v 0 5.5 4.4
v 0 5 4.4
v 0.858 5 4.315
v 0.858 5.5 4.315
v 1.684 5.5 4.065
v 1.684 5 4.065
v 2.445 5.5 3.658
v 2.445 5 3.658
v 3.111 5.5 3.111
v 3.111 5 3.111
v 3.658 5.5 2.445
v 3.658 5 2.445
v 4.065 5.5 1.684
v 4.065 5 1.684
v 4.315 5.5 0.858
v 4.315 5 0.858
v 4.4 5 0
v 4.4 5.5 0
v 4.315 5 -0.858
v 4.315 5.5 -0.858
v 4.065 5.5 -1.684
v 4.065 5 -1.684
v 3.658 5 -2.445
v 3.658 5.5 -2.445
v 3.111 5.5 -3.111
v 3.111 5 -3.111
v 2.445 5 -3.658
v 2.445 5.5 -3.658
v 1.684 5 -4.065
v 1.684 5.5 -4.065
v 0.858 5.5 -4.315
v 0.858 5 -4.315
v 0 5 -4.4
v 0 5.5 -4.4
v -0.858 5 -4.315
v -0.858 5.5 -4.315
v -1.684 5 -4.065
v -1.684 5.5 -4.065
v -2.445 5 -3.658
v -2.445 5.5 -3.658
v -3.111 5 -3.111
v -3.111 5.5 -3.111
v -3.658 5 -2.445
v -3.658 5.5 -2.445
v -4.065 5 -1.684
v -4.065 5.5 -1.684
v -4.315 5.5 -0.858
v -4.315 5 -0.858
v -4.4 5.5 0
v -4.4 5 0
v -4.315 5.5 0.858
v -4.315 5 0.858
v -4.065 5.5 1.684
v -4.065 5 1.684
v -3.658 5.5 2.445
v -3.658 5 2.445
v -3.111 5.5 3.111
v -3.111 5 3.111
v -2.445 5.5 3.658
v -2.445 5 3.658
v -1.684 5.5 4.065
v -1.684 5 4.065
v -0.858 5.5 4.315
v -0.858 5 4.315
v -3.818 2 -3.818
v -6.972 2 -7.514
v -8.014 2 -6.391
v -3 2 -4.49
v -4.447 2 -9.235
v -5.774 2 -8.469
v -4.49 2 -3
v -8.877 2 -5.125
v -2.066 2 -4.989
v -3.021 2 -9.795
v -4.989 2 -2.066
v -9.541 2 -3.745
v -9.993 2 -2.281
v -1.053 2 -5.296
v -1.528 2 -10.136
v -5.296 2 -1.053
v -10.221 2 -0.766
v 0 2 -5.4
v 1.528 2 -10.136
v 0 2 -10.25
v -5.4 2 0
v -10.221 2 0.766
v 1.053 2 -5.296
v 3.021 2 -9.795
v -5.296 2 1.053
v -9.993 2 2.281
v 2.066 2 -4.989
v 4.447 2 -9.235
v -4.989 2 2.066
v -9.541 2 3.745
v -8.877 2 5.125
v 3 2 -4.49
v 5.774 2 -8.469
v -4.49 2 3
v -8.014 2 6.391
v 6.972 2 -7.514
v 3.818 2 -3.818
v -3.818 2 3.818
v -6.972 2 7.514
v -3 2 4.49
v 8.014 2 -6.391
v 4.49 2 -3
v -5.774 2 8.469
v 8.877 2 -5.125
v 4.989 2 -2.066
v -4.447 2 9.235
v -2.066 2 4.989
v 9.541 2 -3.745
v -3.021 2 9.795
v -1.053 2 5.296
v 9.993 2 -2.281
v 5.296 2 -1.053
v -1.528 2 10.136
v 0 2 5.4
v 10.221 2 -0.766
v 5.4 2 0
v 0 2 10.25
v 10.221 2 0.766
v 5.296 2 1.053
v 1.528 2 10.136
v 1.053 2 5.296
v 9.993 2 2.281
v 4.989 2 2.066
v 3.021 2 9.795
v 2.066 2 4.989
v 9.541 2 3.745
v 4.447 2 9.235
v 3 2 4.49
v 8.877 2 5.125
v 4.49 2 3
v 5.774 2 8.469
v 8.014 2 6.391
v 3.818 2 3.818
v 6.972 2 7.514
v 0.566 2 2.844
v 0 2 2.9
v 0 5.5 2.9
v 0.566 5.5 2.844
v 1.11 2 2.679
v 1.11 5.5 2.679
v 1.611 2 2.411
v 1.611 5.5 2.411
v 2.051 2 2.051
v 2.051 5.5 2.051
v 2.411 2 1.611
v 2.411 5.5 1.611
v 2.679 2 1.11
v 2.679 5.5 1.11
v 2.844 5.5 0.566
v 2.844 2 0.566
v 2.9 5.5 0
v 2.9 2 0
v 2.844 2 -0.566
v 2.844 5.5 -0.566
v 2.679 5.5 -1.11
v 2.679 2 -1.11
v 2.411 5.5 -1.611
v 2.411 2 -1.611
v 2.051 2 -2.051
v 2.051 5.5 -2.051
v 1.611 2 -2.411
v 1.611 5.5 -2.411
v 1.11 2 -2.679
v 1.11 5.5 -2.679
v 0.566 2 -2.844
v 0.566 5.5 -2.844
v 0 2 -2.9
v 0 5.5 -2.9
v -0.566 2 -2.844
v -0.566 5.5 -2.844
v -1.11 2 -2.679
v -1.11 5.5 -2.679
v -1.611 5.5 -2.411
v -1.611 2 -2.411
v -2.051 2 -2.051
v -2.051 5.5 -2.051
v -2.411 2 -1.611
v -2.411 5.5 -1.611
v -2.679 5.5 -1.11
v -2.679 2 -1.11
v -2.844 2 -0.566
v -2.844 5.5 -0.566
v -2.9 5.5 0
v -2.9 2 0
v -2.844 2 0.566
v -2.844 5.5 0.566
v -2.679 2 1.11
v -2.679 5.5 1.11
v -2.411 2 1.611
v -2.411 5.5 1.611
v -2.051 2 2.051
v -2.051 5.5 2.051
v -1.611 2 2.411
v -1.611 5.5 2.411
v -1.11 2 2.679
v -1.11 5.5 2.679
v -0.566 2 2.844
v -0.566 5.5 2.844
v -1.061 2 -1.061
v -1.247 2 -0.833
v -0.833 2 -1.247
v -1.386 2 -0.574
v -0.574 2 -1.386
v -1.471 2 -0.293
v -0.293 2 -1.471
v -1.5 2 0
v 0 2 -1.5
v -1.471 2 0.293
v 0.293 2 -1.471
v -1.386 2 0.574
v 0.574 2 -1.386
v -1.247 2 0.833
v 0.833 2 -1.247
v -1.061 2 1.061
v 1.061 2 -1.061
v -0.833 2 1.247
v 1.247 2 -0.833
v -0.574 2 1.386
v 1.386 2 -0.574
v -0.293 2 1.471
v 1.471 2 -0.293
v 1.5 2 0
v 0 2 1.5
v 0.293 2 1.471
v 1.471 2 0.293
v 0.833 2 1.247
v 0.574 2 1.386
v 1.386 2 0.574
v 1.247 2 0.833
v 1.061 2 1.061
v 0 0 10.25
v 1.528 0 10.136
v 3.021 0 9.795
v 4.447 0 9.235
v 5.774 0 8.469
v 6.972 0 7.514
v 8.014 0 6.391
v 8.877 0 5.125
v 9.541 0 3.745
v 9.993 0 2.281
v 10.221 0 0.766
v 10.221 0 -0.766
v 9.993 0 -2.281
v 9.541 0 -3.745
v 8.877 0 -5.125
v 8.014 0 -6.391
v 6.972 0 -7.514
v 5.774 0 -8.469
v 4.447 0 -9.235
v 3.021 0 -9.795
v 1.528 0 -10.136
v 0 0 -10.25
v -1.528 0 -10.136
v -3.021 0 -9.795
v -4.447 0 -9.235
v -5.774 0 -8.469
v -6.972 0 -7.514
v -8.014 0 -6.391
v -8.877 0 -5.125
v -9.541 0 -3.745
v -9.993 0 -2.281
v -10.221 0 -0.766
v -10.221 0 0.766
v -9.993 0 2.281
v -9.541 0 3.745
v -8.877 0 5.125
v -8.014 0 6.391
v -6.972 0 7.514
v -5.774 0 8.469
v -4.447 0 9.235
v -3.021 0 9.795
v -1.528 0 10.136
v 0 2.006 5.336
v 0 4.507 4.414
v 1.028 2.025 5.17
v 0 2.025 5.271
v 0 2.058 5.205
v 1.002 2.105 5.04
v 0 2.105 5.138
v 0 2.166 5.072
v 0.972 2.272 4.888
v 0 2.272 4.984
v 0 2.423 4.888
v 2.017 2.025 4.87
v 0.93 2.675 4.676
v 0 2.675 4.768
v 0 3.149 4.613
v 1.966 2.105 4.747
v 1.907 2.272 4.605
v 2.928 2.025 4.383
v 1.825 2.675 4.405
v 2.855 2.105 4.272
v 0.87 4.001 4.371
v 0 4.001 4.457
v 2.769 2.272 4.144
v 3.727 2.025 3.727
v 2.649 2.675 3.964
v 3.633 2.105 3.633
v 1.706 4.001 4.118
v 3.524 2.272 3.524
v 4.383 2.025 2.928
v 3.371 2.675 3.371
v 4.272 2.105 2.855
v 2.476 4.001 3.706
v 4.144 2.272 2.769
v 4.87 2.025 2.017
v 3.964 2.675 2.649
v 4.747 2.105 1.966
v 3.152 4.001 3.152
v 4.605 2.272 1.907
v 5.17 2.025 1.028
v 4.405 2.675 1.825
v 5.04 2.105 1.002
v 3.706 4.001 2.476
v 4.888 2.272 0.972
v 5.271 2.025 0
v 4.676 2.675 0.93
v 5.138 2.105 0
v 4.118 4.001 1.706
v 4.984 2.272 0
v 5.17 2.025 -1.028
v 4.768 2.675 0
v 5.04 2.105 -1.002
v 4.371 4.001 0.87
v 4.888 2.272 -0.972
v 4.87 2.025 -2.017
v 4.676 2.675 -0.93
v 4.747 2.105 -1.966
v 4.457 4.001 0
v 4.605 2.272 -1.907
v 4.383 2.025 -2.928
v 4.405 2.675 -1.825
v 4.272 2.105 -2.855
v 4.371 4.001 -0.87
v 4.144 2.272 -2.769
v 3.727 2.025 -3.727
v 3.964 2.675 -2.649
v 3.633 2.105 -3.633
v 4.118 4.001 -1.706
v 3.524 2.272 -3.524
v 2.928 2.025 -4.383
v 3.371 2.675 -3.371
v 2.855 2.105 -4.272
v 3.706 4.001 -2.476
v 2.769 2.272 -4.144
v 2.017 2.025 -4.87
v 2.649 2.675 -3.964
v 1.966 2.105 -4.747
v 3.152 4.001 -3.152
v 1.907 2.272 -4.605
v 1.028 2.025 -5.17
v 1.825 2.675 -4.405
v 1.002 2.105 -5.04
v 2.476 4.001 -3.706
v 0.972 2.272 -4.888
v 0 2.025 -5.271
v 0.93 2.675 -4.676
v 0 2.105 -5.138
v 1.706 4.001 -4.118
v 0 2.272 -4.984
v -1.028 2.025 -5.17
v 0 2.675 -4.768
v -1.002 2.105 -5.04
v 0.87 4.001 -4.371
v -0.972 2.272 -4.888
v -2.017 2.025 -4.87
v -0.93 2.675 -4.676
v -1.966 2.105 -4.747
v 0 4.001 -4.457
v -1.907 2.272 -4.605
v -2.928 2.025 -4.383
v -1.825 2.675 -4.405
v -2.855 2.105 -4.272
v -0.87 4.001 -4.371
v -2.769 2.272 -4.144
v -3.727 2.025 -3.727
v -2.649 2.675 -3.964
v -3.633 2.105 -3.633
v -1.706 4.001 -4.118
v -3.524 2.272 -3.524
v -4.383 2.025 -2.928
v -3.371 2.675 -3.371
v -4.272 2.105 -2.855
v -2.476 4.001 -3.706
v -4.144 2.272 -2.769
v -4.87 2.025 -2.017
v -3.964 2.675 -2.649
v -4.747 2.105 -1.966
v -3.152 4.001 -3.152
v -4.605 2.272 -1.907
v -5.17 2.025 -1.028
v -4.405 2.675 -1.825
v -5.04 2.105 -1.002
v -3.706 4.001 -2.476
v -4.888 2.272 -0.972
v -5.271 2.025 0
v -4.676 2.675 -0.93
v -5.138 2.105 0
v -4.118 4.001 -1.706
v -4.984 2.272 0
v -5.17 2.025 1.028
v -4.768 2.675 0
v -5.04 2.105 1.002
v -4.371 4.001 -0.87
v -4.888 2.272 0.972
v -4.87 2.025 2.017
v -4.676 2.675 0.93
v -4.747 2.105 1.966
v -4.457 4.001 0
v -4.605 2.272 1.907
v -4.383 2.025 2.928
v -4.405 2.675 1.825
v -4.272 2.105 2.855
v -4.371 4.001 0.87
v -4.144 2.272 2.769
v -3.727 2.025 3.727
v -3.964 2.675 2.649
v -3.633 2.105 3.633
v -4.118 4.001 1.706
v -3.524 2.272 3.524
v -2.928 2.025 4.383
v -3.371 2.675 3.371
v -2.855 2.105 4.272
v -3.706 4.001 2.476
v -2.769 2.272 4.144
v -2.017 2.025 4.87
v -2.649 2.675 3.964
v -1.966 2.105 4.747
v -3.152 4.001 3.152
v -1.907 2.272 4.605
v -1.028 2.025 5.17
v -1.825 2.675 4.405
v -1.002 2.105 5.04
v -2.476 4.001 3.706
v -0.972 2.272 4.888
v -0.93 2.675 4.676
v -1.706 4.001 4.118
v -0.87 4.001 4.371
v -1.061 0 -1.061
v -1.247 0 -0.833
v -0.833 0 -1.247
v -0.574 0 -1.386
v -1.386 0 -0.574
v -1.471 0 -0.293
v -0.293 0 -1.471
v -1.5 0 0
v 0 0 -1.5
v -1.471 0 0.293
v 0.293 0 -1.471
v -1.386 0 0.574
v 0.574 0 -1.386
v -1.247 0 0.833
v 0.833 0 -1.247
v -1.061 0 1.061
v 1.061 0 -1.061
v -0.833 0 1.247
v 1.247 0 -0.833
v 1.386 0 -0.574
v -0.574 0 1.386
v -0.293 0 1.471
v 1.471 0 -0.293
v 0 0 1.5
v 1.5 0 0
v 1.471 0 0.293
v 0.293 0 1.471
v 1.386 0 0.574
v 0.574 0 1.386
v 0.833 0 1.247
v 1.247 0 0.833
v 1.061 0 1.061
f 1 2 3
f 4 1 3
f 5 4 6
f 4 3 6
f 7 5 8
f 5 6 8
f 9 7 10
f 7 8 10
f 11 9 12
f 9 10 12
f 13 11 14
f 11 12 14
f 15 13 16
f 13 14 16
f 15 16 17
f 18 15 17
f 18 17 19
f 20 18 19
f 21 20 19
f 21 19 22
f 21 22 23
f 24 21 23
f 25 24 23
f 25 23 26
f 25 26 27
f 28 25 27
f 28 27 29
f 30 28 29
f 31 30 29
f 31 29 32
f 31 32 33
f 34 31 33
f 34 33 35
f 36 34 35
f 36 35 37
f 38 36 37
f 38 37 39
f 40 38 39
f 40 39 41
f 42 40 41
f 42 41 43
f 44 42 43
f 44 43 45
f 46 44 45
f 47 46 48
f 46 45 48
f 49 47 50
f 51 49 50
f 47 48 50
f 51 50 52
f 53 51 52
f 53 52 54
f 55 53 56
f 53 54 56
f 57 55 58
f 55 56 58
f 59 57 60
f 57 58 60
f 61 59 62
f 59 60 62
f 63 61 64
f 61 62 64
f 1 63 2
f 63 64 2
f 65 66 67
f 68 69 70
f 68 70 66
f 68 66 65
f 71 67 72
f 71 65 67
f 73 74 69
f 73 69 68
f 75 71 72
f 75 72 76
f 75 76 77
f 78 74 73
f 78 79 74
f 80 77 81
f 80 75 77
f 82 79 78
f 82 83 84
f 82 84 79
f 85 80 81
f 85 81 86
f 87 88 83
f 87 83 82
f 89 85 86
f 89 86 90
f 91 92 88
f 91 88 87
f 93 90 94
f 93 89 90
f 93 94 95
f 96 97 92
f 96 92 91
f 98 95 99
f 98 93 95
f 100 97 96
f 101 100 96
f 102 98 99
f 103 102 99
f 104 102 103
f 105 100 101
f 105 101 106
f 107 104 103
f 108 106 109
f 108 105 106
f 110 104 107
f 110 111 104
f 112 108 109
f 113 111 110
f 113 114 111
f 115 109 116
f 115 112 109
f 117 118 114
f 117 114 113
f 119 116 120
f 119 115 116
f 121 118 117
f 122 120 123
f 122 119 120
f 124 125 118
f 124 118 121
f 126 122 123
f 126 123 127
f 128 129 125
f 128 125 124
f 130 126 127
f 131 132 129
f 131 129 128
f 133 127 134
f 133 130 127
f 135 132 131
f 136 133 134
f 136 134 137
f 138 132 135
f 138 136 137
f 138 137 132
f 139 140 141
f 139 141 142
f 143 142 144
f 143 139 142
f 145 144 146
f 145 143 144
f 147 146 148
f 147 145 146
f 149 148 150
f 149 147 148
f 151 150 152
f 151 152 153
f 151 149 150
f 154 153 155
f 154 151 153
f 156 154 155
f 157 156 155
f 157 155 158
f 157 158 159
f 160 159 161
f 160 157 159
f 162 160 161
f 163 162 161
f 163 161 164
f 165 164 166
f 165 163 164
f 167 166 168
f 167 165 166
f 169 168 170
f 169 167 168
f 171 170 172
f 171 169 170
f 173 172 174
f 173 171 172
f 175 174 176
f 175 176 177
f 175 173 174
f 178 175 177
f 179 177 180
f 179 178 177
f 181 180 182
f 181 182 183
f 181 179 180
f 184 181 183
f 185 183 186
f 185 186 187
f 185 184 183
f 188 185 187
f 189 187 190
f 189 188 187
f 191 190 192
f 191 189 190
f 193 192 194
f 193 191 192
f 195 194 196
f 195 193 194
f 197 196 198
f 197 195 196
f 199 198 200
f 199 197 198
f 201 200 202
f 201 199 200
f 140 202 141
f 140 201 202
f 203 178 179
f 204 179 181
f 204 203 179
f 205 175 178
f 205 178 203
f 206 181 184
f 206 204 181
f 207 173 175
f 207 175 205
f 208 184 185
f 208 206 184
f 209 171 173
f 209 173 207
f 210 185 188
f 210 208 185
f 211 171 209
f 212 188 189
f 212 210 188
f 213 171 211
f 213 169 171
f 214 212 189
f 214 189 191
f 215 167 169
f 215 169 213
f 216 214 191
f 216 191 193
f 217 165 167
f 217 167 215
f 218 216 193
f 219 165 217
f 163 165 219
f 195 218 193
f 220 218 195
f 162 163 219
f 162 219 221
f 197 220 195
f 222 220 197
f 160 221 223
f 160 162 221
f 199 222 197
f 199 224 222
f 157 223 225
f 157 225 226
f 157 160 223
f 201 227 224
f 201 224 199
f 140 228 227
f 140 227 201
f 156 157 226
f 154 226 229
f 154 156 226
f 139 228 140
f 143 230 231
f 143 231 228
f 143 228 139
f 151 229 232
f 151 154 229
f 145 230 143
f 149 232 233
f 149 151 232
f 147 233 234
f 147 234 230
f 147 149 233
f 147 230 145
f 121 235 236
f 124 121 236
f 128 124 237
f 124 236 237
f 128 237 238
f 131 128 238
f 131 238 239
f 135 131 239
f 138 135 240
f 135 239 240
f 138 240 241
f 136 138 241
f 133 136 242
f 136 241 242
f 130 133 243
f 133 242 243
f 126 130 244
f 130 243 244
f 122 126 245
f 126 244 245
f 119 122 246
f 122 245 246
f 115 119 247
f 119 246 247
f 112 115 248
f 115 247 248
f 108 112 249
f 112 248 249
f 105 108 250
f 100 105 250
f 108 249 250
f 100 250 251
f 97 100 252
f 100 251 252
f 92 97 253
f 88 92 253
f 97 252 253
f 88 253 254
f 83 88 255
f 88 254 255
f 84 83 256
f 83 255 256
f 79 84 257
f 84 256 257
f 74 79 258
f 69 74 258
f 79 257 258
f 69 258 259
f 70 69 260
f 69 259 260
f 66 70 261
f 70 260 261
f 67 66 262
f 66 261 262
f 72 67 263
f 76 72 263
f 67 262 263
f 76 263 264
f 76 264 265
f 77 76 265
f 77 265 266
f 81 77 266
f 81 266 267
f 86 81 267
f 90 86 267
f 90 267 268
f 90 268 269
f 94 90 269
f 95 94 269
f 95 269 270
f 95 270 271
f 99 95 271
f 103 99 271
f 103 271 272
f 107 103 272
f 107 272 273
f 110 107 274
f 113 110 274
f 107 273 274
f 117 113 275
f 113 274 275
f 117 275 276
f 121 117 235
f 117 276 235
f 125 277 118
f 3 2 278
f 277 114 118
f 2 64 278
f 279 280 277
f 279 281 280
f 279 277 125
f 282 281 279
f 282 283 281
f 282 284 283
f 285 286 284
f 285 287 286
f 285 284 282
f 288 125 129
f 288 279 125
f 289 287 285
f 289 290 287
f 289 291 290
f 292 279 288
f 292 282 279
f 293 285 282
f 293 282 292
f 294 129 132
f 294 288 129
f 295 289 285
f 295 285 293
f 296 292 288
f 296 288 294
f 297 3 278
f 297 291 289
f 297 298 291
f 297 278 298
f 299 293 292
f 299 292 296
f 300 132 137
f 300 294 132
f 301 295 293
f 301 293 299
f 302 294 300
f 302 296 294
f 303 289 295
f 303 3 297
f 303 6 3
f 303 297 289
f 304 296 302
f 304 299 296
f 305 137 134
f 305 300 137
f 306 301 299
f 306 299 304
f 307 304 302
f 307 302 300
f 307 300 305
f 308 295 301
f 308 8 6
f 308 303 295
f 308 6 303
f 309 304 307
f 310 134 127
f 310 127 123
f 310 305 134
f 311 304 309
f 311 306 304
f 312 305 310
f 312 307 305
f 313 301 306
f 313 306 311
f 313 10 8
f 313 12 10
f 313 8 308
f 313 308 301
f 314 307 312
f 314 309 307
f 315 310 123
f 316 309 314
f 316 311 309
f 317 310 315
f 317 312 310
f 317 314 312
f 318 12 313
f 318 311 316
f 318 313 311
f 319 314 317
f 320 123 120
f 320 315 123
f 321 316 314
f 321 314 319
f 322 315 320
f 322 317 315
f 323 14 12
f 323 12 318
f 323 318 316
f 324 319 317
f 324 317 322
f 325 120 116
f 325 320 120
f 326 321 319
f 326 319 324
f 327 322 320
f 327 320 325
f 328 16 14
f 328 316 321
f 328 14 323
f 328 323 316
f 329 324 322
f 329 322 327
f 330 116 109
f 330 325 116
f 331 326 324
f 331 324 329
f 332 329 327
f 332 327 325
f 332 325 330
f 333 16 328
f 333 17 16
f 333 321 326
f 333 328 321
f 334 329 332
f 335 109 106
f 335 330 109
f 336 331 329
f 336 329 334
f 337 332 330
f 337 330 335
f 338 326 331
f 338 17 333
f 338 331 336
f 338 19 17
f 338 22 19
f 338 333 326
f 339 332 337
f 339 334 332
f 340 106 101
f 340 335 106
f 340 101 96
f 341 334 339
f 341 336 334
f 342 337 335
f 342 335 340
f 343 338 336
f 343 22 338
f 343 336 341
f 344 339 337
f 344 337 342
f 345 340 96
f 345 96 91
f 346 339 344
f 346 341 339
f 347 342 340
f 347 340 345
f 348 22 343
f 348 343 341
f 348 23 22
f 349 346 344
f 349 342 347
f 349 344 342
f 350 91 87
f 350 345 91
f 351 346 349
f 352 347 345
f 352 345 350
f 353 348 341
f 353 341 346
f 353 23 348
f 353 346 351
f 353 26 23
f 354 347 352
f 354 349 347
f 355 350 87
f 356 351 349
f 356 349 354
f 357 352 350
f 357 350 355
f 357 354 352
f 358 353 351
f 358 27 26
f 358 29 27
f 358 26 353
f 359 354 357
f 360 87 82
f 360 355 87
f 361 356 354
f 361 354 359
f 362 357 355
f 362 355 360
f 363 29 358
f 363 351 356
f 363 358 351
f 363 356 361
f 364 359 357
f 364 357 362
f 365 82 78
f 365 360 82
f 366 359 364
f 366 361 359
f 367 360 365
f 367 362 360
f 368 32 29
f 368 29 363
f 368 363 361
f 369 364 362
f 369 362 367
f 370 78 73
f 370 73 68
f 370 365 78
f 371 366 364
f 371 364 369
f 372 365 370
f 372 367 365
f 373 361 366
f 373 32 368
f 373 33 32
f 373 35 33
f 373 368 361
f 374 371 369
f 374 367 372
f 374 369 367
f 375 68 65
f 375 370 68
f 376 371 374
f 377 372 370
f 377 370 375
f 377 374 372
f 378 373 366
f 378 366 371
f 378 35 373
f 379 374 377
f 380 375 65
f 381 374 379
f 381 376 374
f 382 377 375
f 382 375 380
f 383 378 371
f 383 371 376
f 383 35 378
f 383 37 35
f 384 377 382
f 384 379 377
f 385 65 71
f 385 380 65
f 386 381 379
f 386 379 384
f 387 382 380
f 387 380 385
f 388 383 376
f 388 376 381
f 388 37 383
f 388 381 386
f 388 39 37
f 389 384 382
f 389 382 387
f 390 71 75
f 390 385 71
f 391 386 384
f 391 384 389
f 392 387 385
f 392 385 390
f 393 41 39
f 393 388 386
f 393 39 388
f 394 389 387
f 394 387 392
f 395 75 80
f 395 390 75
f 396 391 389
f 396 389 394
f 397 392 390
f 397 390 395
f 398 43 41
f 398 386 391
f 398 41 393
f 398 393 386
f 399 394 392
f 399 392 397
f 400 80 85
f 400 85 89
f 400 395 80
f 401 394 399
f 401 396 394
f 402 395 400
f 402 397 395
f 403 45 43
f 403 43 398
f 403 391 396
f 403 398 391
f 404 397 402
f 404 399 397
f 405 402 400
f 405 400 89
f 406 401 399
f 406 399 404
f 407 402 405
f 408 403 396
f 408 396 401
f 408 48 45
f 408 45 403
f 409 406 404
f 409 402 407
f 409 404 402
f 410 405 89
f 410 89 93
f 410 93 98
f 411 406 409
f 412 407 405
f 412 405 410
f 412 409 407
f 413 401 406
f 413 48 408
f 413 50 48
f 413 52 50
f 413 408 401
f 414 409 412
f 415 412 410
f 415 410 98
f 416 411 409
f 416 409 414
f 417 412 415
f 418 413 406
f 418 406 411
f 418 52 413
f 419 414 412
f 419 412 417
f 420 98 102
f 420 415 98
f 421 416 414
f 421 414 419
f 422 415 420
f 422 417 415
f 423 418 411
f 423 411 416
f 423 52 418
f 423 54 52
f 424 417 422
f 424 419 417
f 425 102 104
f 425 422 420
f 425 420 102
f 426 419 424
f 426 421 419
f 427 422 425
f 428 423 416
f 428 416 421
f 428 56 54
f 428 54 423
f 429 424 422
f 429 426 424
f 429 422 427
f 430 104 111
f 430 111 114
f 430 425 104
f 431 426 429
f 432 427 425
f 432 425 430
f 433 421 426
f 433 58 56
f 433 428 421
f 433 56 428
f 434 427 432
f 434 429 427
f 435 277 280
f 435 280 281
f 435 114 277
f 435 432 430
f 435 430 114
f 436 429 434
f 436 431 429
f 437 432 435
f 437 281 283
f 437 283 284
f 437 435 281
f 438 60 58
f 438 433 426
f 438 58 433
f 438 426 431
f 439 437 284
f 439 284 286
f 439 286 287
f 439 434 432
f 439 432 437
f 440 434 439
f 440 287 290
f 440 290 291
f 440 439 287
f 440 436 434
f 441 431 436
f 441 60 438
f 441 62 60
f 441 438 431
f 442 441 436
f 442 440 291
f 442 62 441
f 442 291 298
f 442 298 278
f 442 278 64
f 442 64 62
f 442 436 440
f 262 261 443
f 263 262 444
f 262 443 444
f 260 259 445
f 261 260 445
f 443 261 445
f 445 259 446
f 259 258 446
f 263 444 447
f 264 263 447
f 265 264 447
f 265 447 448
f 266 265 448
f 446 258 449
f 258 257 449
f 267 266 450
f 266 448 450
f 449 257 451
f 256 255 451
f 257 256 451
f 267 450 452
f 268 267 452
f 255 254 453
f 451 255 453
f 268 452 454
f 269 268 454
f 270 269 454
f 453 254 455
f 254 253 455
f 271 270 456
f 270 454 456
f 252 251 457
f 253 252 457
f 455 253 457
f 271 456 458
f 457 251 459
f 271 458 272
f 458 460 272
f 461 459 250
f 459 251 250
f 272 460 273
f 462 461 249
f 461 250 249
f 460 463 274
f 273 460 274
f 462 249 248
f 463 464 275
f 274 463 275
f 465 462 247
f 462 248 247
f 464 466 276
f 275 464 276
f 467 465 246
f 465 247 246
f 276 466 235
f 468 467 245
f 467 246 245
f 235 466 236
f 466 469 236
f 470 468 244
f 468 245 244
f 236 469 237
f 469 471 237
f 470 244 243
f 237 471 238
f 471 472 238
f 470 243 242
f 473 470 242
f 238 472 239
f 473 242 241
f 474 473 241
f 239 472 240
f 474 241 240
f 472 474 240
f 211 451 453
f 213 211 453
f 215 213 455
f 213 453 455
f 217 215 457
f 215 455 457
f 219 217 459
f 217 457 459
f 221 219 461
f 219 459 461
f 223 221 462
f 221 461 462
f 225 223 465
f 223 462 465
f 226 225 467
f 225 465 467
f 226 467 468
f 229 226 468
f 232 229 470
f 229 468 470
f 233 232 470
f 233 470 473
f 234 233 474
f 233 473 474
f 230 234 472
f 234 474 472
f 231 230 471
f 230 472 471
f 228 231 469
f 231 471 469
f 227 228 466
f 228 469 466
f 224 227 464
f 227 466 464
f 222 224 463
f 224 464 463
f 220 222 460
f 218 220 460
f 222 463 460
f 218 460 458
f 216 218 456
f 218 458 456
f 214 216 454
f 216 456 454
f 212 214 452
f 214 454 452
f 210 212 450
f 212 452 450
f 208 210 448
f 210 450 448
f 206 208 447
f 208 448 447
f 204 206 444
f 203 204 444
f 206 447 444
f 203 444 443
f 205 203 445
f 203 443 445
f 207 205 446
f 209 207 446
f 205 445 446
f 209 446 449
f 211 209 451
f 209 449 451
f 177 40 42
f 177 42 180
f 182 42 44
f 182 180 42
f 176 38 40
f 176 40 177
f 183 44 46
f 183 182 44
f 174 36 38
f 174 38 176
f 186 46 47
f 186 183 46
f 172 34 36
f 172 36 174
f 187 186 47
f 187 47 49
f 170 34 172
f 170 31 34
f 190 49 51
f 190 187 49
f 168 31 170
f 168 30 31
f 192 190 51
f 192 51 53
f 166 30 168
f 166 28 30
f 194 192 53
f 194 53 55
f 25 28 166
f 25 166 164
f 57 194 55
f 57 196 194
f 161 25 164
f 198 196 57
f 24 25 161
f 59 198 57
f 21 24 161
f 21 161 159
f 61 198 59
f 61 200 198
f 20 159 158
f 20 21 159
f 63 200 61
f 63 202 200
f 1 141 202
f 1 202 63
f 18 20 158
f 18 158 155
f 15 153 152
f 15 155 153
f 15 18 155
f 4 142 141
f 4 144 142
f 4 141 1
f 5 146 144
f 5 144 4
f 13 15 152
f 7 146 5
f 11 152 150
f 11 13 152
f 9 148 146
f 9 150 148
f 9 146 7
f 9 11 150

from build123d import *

# Parameters (mm, degrees)
SKETCH1_R           = 10.25
BOSS_EXTRUDE1_DEPTH = 2
SKETCH2_R           = 4.4
SKETCH2_R_2         = 2.9
BOSS_EXTRUDE2_DEPTH = 3.5
FILLET1_SIZE        = 1
FILLET1_SIZE_2      = 3
SKETCH3_R           = 1.5
CUT_EXTRUDE1_DEPTH  = 2


with BuildPart() as part:
    # Sketch1 → Boss-Extrude1 (new body)
    with BuildSketch(Plane(origin=(0, 0, 0), x_dir=(1, 0, 0), z_dir=(0, 1, 0))):
        with Locations(Location((0, 0, 0), (0, 0, 270))):
            Circle(SKETCH1_R)
    extrude(amount=BOSS_EXTRUDE1_DEPTH)

    # Sketch2 → Boss-Extrude2 (add)
    with BuildSketch(Plane(origin=(0, 2, 0), x_dir=(1, 0, 0), z_dir=(0, 1, 0))):
        with Locations(Location((0, 0, 0), (0, 0, 270))):
            Circle(SKETCH2_R)
        with Locations(Location((0, 0, 0), (0, 0, 270))):
            Circle(SKETCH2_R_2, mode=Mode.SUBTRACT)
    extrude(amount=BOSS_EXTRUDE2_DEPTH)

    # Fillet1
    # an asymmetric fillet: 3, 1 mm, written as the material it adds along each edge
    with BuildSketch(Plane(origin=(0, 2, 0), x_dir=(0, 0, 1), z_dir=(-1, 0, 0))) as fillet1_piece_1:
        with BuildLine():
            Bezier((4.4 + FILLET1_SIZE, 0), (4.4, 0), (4.4, FILLET1_SIZE_2), weights=[1, 0.707106781, 1])
            Line((4.4, FILLET1_SIZE_2), (4.4, 0))
            Line((4.4, 0), (4.4 + FILLET1_SIZE, 0))
        make_face()
    revolve(axis=Axis((0, 2, 0), (0, 1, 0)))

    # Sketch3 → Cut-Extrude1 (cut)
    with BuildSketch(Plane.XZ):
        with Locations(Location((0, 0, 0), (0, 0, 270))):
            Circle(SKETCH3_R)
    extrude(amount=-CUT_EXTRUDE1_DEPTH, mode=Mode.SUBTRACT)


solid = part.part
